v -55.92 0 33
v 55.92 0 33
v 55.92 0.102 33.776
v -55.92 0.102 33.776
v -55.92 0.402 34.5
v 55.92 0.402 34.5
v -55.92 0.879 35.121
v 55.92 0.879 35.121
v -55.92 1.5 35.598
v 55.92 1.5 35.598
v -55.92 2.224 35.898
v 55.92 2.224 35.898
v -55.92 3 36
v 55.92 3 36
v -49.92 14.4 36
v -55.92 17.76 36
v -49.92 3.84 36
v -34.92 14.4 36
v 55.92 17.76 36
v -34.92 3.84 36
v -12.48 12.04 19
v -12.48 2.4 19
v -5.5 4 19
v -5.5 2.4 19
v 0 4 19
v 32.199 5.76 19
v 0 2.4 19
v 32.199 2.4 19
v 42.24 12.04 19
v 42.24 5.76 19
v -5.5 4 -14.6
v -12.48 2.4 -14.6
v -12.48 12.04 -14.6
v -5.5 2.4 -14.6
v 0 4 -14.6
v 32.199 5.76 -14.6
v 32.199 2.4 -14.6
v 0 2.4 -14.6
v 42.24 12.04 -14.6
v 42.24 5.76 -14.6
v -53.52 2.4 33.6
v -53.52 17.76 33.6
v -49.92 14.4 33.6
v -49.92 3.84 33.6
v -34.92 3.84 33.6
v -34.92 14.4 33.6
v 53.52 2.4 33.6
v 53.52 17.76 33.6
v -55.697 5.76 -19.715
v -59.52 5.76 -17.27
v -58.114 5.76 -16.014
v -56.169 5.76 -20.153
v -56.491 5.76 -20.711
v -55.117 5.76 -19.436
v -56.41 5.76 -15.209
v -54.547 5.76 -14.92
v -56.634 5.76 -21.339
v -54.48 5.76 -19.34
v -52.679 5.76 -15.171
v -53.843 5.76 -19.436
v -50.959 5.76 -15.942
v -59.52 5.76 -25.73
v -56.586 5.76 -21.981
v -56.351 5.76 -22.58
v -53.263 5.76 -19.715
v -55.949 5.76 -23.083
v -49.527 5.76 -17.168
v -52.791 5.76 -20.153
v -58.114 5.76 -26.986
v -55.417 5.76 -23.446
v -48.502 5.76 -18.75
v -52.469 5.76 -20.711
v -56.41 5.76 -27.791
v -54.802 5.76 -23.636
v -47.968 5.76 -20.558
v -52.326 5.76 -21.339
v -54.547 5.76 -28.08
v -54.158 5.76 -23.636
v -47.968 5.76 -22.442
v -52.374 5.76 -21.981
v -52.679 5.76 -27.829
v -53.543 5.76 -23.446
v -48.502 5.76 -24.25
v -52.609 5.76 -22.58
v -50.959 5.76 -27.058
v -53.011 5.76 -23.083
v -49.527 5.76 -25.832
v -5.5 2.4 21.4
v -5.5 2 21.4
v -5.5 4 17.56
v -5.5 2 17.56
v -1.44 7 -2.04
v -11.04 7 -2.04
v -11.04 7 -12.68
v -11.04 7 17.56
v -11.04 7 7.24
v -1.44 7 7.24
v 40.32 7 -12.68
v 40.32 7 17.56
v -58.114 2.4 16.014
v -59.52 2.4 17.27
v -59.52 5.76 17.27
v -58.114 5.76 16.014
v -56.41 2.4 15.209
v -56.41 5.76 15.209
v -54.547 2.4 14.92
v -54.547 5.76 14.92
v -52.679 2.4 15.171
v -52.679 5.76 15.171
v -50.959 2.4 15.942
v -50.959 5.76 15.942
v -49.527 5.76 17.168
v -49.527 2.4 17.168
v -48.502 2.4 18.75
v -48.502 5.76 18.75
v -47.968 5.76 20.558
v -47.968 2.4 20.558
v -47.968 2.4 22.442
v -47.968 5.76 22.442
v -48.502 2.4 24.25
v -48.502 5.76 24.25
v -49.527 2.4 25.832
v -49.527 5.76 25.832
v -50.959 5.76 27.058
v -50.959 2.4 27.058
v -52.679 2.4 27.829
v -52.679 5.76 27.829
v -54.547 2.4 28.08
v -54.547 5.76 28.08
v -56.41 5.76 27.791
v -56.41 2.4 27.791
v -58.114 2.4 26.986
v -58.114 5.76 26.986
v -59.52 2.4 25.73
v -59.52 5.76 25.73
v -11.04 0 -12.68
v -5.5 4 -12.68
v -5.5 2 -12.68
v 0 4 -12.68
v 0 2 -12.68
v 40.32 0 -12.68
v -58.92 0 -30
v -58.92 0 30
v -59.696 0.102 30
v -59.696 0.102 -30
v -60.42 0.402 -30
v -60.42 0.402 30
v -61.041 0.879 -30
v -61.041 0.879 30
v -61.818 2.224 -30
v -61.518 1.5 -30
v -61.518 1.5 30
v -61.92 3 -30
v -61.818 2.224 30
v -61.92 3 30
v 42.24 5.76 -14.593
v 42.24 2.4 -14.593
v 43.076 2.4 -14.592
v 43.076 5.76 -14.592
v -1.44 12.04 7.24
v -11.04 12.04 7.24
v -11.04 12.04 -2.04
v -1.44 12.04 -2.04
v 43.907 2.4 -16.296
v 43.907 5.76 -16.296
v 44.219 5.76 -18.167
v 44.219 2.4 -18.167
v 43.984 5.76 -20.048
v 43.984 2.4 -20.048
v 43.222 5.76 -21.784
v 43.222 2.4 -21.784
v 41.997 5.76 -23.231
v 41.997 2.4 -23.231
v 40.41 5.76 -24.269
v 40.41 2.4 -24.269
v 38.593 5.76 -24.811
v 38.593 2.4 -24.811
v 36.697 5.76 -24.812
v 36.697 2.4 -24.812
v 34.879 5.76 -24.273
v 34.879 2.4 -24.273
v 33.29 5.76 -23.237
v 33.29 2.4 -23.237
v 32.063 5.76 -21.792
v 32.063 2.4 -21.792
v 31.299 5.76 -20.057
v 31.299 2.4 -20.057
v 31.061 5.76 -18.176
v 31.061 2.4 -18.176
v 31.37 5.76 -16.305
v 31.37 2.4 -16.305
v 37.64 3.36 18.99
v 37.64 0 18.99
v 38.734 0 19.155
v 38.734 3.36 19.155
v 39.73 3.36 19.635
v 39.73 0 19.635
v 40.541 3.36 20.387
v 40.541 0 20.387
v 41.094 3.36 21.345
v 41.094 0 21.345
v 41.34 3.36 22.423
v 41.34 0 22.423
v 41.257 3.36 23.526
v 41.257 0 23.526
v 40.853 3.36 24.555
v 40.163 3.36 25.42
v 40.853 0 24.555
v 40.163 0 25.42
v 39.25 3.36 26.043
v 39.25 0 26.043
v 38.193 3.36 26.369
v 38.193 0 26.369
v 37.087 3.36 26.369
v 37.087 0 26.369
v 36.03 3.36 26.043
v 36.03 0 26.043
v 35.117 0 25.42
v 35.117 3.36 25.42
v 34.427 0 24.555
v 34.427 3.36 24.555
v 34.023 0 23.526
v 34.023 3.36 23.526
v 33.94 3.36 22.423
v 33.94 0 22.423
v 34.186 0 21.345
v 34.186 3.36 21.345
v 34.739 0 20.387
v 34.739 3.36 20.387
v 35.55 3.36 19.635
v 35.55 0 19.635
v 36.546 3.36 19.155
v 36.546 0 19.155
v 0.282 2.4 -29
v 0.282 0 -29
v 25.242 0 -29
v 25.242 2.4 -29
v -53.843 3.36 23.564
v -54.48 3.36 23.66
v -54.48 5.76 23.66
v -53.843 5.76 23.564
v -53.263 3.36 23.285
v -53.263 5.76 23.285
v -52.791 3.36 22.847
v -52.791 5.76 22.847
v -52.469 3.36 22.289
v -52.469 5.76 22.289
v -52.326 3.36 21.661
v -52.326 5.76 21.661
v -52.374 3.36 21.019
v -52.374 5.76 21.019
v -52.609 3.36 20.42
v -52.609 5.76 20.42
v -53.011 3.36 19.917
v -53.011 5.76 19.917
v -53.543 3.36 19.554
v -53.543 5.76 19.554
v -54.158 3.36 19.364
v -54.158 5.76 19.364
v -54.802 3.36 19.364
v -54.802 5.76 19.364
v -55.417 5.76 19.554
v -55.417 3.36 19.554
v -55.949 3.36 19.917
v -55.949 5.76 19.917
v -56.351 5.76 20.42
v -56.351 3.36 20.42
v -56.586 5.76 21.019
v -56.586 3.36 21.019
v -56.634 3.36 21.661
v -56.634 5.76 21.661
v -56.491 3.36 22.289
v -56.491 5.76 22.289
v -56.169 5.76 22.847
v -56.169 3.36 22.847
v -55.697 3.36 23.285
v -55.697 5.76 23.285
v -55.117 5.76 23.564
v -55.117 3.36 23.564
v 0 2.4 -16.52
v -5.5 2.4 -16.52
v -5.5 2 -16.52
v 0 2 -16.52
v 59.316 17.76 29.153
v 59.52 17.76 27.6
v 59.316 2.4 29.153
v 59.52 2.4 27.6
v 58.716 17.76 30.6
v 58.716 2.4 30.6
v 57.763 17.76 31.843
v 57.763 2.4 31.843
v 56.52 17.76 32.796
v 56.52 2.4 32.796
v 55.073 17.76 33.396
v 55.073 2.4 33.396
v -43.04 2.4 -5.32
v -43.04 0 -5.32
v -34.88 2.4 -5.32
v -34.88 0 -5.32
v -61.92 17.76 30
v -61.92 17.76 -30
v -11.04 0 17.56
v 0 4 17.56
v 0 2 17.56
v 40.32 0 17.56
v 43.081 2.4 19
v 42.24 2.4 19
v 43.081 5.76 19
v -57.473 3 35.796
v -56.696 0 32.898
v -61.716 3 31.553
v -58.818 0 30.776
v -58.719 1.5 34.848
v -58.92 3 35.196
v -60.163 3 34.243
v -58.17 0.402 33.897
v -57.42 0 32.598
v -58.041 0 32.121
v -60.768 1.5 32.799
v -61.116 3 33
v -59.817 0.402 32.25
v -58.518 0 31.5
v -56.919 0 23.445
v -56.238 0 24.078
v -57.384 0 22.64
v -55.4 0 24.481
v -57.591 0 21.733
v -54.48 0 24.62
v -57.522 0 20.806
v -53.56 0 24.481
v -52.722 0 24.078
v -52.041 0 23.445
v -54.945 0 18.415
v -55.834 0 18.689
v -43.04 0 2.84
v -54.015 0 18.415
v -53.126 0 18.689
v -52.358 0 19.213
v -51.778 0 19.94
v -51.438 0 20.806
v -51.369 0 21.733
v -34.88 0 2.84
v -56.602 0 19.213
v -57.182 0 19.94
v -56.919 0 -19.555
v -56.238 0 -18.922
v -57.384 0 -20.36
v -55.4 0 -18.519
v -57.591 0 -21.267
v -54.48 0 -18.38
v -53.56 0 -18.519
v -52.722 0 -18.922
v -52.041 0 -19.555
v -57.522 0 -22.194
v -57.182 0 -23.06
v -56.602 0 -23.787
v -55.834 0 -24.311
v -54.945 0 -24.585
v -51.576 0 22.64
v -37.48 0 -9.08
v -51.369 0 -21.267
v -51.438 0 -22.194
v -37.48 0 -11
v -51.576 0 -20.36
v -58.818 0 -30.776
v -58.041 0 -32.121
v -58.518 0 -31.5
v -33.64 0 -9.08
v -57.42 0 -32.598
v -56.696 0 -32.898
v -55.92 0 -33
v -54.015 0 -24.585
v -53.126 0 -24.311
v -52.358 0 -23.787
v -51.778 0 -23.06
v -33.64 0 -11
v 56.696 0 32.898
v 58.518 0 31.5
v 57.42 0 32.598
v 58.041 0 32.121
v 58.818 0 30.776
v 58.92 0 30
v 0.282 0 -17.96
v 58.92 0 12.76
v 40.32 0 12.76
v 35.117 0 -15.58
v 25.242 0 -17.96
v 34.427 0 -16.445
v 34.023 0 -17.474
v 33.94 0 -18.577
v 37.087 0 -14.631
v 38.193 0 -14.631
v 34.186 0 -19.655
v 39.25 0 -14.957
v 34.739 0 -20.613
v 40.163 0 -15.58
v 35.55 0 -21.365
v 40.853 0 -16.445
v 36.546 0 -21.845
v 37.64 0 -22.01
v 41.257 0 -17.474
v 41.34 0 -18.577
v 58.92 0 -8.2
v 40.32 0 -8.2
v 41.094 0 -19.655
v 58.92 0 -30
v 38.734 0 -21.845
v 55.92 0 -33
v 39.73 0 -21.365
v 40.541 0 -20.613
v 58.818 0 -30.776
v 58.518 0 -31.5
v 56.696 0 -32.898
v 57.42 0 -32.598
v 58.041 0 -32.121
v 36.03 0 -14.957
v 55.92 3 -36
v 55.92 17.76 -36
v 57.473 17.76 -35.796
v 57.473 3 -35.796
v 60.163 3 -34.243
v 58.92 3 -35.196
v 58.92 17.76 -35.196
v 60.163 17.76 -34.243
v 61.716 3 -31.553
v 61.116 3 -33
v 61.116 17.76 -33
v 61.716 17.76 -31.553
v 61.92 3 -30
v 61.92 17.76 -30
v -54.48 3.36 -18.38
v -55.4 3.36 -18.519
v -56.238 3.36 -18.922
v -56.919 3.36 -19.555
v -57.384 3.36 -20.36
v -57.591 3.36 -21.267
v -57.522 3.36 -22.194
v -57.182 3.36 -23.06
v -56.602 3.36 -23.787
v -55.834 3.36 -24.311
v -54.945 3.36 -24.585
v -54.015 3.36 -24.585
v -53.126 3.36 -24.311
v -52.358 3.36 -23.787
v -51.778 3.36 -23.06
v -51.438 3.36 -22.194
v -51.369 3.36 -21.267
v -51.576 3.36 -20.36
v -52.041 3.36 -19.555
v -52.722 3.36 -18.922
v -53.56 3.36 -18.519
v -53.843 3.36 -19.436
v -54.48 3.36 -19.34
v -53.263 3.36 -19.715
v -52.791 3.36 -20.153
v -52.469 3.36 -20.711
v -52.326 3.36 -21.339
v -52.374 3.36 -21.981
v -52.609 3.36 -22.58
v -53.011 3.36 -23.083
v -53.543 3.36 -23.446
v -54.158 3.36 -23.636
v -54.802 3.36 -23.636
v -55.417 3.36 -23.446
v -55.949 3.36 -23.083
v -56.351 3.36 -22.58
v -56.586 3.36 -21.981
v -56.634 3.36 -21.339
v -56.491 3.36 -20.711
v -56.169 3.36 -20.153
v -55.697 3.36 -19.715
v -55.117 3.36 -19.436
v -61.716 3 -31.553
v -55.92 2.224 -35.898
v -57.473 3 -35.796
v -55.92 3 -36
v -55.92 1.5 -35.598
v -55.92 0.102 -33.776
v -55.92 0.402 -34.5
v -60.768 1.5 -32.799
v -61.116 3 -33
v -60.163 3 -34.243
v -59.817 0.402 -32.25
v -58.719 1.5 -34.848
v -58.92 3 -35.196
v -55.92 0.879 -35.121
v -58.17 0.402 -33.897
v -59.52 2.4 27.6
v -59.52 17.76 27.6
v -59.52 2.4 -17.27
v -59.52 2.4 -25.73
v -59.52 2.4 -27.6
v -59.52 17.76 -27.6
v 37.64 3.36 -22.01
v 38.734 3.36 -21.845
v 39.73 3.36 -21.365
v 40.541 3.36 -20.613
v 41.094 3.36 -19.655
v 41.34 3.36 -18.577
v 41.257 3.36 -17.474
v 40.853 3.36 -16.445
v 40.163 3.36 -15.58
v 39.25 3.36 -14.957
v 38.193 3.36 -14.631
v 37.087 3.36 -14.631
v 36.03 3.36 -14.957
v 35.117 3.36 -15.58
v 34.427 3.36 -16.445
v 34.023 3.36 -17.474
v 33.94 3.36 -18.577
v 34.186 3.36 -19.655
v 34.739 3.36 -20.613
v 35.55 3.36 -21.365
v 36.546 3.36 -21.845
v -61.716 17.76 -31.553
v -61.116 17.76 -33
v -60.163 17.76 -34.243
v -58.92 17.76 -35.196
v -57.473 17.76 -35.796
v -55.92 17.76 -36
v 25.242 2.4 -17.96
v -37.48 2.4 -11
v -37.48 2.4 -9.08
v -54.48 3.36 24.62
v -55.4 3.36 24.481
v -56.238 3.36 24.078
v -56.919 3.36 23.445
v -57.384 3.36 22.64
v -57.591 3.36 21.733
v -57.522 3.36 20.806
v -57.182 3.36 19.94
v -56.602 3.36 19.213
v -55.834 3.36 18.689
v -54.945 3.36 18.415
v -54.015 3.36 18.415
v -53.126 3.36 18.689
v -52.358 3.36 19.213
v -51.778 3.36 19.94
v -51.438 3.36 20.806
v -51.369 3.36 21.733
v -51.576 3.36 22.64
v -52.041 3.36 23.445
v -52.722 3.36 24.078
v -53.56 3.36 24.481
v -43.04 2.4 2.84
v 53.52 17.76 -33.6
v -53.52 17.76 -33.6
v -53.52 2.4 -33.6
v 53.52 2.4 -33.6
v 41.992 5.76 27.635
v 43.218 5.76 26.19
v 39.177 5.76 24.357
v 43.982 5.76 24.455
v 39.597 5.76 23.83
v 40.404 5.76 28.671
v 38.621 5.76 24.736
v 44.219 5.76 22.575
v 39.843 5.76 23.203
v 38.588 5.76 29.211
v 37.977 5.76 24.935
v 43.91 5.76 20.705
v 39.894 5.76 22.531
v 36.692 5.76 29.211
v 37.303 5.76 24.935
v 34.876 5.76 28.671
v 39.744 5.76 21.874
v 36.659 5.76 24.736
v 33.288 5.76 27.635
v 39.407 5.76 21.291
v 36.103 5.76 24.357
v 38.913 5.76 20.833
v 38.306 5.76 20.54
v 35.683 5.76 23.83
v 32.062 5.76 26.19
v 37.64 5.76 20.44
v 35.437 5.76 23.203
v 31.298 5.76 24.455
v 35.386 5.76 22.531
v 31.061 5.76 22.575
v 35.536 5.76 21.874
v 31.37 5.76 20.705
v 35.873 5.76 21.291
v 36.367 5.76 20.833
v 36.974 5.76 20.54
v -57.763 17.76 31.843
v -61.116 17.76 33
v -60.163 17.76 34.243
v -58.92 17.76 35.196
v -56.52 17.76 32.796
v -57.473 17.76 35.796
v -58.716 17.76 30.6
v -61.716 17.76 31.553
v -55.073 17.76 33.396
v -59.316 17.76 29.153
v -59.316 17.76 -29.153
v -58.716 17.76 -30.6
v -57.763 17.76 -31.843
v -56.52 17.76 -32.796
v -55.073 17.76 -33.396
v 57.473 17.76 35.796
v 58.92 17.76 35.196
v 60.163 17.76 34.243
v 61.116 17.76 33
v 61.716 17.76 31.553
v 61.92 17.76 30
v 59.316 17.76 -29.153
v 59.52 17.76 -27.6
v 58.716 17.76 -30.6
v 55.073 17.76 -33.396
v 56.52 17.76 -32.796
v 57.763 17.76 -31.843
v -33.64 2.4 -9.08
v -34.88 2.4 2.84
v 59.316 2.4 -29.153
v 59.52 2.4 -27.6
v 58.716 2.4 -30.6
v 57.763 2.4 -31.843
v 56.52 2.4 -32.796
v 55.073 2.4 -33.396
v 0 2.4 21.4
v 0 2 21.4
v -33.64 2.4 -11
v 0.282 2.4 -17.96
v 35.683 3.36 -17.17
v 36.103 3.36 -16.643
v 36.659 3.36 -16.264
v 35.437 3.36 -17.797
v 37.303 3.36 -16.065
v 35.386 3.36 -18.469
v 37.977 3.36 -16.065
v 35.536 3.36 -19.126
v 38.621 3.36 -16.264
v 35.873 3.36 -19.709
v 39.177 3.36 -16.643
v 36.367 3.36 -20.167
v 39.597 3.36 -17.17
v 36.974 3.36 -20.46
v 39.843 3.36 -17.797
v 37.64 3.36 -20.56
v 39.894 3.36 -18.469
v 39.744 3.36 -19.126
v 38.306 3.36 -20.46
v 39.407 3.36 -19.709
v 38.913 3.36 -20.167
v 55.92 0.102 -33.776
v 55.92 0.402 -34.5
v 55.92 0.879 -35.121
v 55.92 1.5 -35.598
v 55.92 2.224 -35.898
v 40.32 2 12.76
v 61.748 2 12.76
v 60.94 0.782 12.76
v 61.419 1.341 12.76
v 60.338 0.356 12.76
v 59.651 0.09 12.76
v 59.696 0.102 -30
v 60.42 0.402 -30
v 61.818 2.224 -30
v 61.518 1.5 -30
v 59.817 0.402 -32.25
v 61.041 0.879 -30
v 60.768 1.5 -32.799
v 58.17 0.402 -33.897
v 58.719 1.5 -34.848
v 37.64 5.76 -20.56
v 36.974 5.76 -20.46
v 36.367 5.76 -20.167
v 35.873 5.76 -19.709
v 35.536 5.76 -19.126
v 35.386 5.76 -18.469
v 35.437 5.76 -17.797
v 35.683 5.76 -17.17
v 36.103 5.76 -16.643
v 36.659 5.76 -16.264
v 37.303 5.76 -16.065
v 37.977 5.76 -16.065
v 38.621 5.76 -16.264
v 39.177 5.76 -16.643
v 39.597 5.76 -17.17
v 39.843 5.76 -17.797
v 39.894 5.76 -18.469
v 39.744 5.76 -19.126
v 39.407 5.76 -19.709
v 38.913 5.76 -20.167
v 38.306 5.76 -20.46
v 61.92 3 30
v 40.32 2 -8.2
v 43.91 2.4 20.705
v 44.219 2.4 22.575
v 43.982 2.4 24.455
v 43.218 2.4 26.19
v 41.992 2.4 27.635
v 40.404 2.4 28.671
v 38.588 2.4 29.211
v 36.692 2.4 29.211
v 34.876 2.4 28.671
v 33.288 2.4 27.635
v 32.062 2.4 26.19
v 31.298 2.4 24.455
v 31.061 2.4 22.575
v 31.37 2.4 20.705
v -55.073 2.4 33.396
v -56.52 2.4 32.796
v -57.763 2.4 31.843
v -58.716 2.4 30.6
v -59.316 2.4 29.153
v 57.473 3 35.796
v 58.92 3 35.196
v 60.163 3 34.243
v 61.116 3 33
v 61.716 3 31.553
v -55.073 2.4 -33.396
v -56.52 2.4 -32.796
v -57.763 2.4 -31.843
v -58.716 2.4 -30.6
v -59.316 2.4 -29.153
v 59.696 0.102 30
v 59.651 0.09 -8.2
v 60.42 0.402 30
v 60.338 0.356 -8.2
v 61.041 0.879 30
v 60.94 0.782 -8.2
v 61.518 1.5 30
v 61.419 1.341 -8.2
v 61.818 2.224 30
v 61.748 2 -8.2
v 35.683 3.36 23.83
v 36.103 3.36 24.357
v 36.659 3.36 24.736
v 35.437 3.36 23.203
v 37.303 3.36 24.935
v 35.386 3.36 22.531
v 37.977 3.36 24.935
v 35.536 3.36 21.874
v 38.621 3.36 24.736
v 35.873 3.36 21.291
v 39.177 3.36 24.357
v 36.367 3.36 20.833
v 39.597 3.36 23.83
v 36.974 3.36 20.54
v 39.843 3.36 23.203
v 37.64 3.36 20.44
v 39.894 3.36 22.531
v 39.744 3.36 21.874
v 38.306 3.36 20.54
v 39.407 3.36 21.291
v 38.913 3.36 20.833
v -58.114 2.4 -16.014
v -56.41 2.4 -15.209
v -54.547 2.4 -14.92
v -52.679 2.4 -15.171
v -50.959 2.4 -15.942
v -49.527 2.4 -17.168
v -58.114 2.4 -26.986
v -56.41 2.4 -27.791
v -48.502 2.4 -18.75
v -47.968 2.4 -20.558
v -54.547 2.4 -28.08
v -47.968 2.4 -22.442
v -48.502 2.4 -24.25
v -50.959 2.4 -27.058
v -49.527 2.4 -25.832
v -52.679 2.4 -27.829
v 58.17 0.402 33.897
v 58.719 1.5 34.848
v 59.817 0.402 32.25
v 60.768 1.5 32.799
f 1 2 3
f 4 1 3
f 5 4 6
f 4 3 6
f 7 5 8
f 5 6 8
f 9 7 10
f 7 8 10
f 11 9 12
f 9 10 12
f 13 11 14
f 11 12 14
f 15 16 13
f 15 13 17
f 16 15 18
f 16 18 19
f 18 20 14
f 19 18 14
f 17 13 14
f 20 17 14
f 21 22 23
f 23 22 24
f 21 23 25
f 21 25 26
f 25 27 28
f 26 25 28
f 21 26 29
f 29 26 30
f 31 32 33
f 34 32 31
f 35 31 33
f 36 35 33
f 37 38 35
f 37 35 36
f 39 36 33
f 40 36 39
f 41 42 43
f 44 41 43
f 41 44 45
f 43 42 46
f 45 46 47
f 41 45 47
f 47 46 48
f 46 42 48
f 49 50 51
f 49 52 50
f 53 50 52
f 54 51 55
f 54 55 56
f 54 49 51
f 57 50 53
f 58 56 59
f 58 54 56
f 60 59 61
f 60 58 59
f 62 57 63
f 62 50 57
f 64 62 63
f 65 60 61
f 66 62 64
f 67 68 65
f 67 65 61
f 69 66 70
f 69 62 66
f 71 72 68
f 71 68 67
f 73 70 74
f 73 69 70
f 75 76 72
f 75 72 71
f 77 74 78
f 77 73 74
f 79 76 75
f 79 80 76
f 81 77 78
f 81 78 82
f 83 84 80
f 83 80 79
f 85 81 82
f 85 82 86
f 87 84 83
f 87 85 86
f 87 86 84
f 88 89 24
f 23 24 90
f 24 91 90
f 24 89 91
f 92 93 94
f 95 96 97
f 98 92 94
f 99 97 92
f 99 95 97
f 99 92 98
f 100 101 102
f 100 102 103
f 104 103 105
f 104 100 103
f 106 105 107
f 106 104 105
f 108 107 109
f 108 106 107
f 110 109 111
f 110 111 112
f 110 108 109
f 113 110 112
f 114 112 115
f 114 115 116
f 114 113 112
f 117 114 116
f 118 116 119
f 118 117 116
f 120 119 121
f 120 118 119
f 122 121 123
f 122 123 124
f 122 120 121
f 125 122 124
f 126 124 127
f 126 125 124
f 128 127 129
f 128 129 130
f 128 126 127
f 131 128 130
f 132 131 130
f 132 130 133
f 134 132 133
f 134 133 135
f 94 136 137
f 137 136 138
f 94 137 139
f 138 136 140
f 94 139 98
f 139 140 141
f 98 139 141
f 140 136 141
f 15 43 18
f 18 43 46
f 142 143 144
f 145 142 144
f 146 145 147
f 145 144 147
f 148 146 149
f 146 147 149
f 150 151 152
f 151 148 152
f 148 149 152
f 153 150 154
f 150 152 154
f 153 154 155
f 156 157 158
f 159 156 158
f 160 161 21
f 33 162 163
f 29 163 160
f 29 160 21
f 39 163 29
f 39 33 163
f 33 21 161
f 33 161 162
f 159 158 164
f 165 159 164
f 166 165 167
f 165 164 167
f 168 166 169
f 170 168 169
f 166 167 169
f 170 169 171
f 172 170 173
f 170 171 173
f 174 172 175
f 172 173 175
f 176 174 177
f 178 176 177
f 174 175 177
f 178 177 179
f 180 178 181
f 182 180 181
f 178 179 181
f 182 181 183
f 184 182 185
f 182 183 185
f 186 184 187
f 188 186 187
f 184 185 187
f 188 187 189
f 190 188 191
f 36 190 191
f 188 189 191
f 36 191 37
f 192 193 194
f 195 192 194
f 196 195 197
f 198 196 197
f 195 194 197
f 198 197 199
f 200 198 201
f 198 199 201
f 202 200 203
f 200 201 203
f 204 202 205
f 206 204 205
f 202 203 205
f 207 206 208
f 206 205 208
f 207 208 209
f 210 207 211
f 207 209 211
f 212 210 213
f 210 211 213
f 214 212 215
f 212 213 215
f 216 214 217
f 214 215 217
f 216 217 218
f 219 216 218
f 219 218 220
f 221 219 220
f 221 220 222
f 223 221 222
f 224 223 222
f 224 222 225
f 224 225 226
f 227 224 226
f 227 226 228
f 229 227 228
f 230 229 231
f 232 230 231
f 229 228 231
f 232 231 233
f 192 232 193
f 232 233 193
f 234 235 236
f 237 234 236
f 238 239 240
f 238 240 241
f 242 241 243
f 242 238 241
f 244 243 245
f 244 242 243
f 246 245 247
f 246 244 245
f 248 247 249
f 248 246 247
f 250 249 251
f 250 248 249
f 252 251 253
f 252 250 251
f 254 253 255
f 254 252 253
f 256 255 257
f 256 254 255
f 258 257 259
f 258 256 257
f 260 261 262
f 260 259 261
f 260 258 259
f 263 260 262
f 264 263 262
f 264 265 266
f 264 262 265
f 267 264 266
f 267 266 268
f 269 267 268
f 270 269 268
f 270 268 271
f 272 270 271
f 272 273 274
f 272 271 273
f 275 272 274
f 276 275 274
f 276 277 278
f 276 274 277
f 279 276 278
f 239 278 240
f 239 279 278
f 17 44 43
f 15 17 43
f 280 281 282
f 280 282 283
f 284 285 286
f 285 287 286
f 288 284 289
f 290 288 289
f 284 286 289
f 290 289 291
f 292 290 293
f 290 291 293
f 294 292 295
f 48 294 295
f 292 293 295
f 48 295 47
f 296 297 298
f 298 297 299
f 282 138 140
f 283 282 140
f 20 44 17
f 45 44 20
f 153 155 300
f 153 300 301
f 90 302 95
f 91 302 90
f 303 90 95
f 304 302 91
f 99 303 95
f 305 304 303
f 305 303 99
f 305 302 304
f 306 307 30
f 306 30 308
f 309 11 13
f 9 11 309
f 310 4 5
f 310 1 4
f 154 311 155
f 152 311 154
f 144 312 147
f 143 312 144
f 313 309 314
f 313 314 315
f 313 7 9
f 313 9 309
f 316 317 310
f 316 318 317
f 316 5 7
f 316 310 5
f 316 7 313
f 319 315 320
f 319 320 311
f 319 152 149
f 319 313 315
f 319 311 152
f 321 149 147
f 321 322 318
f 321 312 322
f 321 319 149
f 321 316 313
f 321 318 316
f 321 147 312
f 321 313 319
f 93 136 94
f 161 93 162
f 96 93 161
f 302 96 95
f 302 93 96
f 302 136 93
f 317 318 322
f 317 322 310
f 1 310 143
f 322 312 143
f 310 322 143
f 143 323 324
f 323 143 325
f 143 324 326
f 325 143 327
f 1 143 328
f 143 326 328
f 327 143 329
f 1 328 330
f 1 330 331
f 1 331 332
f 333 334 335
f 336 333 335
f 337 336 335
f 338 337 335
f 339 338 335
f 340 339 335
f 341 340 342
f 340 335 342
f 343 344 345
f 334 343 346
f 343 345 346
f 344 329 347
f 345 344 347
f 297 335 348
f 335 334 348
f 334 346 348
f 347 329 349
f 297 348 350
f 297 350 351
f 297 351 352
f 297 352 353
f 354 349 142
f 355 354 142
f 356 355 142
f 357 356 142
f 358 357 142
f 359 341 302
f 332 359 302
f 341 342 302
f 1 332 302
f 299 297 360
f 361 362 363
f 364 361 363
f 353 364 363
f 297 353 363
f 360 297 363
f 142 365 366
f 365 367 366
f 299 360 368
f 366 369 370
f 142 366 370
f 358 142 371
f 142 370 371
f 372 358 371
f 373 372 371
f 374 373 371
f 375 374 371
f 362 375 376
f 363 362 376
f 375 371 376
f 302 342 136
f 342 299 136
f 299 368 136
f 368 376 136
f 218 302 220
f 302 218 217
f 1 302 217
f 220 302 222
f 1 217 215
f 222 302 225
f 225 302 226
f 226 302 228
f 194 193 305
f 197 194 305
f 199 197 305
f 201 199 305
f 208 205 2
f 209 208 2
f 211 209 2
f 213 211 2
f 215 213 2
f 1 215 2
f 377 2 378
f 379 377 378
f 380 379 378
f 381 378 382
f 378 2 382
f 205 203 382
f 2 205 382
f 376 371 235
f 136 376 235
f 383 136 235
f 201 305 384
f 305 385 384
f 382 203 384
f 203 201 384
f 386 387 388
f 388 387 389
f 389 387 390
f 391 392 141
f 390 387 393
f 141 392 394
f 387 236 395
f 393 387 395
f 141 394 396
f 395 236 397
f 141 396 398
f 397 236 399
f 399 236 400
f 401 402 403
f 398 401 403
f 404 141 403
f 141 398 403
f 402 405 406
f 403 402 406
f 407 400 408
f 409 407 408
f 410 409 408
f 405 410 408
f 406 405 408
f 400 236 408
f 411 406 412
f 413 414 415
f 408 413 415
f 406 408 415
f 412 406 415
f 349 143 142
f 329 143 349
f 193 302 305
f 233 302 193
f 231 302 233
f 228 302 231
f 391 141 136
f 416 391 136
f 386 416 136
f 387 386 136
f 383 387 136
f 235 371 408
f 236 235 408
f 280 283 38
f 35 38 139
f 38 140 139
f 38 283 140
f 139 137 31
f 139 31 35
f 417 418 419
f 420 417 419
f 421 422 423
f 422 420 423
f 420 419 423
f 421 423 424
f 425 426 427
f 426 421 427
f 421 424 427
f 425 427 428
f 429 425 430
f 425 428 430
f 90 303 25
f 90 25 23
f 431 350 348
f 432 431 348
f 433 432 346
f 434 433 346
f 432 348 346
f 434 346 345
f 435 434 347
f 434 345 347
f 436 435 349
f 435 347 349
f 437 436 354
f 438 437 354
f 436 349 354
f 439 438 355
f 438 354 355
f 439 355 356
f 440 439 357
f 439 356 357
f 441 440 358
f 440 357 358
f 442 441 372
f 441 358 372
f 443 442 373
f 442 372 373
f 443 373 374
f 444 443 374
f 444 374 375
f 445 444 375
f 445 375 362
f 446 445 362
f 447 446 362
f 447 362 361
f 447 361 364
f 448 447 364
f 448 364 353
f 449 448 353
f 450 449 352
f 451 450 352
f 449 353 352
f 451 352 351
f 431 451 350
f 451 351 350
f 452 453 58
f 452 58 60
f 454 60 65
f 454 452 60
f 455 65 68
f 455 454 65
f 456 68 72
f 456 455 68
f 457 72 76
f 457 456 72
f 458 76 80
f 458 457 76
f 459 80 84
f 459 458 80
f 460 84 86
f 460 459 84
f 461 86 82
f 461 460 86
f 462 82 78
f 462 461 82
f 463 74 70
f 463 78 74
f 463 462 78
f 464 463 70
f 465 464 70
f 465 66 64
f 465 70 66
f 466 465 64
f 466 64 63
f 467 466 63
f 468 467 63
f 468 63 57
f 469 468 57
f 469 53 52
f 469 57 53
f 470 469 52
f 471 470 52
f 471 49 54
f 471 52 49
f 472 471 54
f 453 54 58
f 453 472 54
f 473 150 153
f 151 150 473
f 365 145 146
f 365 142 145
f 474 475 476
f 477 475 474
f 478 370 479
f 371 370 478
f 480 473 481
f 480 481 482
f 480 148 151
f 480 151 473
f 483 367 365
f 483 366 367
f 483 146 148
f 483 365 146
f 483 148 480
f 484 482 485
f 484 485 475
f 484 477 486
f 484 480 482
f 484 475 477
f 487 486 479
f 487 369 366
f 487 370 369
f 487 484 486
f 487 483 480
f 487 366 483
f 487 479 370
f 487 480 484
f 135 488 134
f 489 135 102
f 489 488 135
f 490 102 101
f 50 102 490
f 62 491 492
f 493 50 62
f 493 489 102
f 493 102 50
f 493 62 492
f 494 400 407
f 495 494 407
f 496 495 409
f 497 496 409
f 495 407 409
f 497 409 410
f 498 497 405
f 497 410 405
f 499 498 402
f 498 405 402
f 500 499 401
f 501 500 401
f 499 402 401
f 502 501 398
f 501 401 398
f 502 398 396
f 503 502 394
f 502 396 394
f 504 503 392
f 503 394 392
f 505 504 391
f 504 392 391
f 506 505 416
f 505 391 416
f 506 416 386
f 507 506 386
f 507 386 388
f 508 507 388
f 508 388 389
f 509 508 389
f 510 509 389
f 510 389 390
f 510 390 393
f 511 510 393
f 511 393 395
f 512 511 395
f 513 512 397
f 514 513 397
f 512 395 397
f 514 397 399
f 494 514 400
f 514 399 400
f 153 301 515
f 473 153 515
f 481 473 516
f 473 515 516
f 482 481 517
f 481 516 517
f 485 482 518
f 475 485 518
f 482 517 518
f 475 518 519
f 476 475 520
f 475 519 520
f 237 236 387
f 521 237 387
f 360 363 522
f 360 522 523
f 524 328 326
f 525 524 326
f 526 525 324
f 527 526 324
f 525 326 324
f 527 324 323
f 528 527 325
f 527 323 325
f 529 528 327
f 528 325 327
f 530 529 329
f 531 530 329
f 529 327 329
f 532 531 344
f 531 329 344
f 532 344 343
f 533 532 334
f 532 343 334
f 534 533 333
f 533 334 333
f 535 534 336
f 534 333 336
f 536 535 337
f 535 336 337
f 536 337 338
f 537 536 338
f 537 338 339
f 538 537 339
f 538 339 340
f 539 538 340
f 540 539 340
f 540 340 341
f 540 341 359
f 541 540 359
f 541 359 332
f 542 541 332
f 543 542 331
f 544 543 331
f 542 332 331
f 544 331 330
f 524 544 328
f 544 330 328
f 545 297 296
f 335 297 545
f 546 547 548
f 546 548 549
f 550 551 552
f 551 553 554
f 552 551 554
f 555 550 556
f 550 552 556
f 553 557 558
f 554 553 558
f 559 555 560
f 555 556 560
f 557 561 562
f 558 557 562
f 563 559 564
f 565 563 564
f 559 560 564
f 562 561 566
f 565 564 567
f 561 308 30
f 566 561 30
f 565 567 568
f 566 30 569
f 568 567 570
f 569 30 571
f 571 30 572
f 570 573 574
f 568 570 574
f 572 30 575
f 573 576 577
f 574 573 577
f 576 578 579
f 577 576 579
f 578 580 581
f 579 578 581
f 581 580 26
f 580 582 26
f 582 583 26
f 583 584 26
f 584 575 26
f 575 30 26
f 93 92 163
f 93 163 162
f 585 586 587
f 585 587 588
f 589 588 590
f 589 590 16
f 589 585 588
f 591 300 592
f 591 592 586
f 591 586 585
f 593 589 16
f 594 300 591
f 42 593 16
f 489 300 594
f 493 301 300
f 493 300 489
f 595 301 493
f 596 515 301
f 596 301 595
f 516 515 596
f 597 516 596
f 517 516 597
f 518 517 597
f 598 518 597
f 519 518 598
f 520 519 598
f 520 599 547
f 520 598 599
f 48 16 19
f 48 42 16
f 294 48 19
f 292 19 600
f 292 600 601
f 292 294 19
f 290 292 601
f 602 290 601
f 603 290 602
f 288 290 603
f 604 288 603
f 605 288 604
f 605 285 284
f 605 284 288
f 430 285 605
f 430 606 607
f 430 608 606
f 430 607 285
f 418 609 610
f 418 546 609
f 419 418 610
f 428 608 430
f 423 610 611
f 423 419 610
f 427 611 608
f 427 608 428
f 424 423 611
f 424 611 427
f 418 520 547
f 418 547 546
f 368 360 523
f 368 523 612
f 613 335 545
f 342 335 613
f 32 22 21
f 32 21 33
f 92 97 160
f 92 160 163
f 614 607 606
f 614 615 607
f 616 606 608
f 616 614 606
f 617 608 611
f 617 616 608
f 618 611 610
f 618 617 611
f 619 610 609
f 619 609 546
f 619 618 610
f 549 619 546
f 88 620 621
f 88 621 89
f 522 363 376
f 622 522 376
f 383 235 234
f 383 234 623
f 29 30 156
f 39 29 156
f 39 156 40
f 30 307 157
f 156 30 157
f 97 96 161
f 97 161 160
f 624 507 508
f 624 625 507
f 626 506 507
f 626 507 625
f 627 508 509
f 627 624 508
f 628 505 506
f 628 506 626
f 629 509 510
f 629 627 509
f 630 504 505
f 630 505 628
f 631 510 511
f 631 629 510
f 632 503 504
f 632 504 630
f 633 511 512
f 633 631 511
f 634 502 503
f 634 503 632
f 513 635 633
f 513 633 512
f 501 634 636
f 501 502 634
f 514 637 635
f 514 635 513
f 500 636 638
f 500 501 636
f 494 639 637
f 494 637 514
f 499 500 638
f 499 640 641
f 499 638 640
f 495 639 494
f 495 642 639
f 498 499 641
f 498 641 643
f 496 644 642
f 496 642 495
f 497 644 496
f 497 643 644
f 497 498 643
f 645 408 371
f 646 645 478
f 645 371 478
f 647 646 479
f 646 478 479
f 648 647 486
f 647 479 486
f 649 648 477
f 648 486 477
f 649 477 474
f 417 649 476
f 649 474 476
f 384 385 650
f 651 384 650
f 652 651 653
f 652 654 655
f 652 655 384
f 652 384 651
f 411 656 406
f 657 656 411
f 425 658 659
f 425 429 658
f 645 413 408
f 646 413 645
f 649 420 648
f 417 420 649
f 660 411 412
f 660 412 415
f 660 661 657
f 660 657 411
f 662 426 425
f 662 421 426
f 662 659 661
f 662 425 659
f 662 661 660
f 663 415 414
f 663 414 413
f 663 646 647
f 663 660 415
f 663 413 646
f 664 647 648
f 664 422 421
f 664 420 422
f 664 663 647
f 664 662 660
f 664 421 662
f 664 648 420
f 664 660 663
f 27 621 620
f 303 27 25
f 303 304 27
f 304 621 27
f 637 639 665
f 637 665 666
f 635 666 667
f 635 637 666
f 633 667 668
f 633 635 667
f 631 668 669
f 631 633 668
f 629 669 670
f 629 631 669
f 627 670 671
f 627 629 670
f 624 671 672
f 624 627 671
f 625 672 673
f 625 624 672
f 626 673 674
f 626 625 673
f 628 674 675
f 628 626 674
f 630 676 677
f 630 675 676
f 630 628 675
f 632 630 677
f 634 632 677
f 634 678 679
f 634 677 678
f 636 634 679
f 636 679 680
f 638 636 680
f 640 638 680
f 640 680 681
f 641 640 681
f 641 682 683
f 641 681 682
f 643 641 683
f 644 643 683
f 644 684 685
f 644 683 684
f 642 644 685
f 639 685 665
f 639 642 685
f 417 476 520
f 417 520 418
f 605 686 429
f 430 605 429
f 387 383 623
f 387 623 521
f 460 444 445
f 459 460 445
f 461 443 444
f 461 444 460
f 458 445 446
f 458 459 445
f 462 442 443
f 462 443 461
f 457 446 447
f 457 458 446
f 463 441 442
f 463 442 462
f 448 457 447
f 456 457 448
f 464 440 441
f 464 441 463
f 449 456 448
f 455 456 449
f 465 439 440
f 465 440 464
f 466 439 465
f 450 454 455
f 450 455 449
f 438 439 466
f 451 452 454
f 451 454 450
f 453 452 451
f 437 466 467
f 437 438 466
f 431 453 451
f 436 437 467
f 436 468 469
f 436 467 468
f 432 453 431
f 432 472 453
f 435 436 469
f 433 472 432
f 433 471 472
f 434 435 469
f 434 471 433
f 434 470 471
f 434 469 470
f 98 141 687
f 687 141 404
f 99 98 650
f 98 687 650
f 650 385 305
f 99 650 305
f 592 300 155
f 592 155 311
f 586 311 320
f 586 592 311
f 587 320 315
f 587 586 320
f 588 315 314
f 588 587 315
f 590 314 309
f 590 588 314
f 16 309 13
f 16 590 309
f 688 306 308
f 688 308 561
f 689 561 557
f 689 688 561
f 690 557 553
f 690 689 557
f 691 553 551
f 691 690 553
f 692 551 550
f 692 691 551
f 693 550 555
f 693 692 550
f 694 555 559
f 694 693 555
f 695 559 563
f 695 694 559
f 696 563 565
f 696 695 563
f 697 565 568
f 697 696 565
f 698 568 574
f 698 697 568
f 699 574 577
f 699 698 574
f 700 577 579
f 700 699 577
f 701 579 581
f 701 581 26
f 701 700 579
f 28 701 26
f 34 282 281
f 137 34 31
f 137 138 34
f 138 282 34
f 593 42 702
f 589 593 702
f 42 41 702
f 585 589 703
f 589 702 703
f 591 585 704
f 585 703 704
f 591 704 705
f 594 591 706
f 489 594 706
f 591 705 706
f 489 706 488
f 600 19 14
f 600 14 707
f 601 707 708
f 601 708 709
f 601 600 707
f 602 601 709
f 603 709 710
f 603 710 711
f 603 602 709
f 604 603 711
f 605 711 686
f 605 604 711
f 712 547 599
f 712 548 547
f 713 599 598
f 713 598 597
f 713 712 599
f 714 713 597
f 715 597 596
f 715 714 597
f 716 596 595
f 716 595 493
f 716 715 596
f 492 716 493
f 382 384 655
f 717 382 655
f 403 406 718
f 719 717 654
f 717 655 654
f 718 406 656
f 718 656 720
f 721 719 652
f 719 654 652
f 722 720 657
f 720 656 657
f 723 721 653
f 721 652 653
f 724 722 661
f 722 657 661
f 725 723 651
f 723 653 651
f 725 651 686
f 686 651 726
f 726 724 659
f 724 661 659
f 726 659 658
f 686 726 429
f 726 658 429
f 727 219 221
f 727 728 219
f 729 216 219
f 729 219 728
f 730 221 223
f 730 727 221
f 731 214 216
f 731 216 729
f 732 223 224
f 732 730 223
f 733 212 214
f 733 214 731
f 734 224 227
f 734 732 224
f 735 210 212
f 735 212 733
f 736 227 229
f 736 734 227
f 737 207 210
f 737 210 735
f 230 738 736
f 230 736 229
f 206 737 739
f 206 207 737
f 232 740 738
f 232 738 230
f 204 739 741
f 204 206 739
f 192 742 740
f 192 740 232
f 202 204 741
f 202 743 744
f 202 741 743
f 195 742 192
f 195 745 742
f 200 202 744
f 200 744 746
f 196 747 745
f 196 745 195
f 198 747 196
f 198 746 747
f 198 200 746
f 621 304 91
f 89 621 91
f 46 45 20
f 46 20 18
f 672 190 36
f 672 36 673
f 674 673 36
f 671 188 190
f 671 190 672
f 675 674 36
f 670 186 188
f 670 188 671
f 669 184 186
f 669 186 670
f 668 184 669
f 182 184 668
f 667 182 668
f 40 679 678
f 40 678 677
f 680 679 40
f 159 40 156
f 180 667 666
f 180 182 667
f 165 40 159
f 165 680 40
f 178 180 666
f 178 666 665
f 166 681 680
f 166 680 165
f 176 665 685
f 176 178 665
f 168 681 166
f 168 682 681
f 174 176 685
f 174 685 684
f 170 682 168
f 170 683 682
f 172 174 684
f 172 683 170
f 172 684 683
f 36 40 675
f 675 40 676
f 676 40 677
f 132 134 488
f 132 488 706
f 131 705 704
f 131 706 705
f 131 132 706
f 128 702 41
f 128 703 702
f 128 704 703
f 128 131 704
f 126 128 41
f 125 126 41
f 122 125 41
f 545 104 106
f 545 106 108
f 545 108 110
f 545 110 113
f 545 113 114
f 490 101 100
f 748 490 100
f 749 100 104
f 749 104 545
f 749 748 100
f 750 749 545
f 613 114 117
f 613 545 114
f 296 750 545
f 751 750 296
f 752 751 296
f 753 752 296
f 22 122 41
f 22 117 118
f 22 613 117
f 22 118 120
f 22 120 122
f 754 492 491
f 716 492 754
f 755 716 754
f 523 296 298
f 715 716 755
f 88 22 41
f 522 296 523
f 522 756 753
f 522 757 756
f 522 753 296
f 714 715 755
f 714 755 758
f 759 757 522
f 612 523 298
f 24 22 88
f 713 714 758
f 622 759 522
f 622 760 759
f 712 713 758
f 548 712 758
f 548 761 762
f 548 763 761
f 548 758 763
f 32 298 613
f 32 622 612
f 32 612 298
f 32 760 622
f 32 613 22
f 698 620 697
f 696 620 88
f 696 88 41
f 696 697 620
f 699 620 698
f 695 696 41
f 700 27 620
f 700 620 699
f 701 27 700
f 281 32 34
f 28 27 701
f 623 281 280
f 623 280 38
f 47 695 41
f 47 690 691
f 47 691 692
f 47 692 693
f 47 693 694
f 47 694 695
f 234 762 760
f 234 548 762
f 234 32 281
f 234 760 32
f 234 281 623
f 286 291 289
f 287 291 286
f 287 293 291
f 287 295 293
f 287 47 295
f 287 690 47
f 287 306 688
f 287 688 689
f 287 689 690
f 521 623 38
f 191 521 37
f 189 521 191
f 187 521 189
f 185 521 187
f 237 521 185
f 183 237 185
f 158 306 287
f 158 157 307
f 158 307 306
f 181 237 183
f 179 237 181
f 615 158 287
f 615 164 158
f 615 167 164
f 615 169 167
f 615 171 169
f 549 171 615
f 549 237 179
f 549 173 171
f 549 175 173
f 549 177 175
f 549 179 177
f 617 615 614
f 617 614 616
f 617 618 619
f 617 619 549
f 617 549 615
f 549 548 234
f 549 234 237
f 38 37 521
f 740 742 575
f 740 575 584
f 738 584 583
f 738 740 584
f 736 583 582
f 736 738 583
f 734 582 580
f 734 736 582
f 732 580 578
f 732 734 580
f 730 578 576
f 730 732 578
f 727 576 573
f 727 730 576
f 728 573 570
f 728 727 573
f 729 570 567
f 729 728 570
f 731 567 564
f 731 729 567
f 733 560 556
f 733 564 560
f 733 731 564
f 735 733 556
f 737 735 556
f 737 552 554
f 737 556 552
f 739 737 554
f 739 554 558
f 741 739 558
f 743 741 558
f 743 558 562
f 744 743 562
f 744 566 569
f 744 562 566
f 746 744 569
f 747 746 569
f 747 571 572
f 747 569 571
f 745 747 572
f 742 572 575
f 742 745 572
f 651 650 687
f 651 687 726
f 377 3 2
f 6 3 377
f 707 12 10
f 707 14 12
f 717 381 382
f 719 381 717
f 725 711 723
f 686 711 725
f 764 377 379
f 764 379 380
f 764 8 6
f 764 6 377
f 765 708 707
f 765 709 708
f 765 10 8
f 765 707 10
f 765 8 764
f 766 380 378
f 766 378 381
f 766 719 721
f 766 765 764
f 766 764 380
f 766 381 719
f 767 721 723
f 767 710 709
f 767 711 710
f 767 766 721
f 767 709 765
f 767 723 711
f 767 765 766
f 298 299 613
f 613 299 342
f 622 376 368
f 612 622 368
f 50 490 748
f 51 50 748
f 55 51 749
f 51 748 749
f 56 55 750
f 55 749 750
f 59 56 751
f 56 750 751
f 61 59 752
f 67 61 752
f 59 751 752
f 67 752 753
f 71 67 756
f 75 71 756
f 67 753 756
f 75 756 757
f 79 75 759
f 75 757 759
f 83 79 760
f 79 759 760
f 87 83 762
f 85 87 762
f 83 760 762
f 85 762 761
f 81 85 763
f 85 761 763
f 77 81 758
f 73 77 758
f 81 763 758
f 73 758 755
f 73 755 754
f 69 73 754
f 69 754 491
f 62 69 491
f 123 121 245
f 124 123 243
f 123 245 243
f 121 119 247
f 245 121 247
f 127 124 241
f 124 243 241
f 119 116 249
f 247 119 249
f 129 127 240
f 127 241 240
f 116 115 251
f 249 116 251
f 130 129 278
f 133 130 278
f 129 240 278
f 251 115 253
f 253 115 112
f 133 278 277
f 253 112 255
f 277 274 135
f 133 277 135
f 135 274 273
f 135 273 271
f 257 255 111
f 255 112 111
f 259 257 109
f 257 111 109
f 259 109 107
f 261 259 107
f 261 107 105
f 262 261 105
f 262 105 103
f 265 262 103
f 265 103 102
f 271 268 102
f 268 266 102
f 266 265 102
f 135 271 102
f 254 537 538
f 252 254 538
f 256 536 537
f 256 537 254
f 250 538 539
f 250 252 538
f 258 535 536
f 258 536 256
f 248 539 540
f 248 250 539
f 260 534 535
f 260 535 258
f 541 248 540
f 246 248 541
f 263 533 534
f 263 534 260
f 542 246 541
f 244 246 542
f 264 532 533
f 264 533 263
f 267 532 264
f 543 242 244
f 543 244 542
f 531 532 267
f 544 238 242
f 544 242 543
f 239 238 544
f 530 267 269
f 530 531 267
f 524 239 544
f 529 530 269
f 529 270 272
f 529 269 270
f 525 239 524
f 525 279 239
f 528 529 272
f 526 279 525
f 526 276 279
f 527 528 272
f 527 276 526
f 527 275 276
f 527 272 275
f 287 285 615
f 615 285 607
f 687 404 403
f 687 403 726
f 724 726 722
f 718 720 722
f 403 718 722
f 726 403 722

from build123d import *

# Parameters (mm, degrees)
SKETCH_1_W           = 123.84
SKETCH_1_H           = 72
EXTRUDE_1_DEPTH      = 17.76
SKETCH_8_W           = 119.04
SKETCH_8_H           = 67.2
CUT_EXTRUDE_5_DEPTH  = 15.36
SKETCH_10_W          = 54.72
SKETCH_10_H          = 33.6
EXTRUDE_2_DEPTH      = 9.64
SKETCH_11_W          = 15
SKETCH_11_H          = 10.56
CUT_EXTRUDE_7_DEPTH  = 5
SKETCH_12_W          = 51.36
SKETCH_12_H          = 30.24
CUT_EXTRUDE_8_DEPTH  = 7
SKETCH_13_W          = 24.6
SKETCH_13_H          = 20.96
CUT_EXTRUDE_9_DEPTH  = 2
CUT_EXTRUDE_16_DEPTH = 73.428336996
FILLET_1_R           = 6
FILLET_3_R           = 3
FILLET_5_R           = 6
SKETCH_19_W          = 5.5
SKETCH_19_H          = 2
CUT_EXTRUDE_14_DEPTH = 3.84
SKETCH_20_W          = 5.5
SKETCH_20_H          = 2
CUT_EXTRUDE_15_DEPTH = 3.84
EXTRUDE_3_DEPTH      = 3.36
EXTRUDE_4_DEPTH      = 3.36
SKETCH_25_R          = 2.16
SKETCH_25_R_2        = 2.26
CUT_EXTRUDE_17_DEPTH = 74.793658264
SKETCH_22_R          = 3.71
SKETCH_22_R_2        = 3.12
CUT_EXTRUDE_18_DEPTH = 3.36
SKETCH_26_W          = 24.96
SKETCH_26_H          = 11.04
SKETCH_26_W_2        = 3.84
SKETCH_26_H_2        = 1.92
SKETCH_26_W_3        = 8.16
SKETCH_26_H_3        = 8.16
CUT_EXTRUDE_19_DEPTH = 74.793658264


with BuildPart() as part:
    # Эскиз1 → Бобышка-Вытянуть1 (new body)
    with BuildSketch(Plane(origin=(0, 0, 0), x_dir=(1, 0, 0), z_dir=(0, 1, 0))):
        Rectangle(SKETCH_1_W, SKETCH_1_H)
    extrude(amount=EXTRUDE_1_DEPTH)

    # Эскиз8 → Вырез-Вытянуть5 (cut)
    with BuildSketch(Plane(origin=(0, 17.76, 0), x_dir=(1, 0, 0), z_dir=(0, 1, 0))):
        Rectangle(SKETCH_8_W, SKETCH_8_H)
    extrude(amount=-CUT_EXTRUDE_5_DEPTH, mode=Mode.SUBTRACT)

    # Эскиз10 → Бобышка-Вытянуть2 (add)
    with BuildSketch(Plane(origin=(0, 2.4, 0), x_dir=(1, 0, 0), z_dir=(0, 1, 0))):
        with Locations((14.88, -2.2)):
            Rectangle(SKETCH_10_W, SKETCH_10_H)
    extrude(amount=EXTRUDE_2_DEPTH)

    # Эскиз11 → Вырез-Вытянуть7 (cut)
    with BuildSketch(Plane.XY.offset(33.6)):
        with Locations((-42.42, 9.12)):
            Rectangle(SKETCH_11_W, SKETCH_11_H)
    extrude(amount=CUT_EXTRUDE_7_DEPTH, mode=Mode.SUBTRACT)

    # Эскиз12 → Вырез-Вытянуть8 (cut)
    with BuildSketch(Plane.XZ):
        with Locations((14.64, 2.44)):
            Rectangle(SKETCH_12_W, SKETCH_12_H)
    extrude(amount=-CUT_EXTRUDE_8_DEPTH, mode=Mode.SUBTRACT)

    # Эскиз13 → Вырез-Вытянуть9 (cut)
    with BuildSketch(Plane.XZ):
        with Locations((49.62, 2.28)):
            Rectangle(SKETCH_13_W, SKETCH_13_H)
    extrude(amount=-CUT_EXTRUDE_9_DEPTH, mode=Mode.SUBTRACT)

    # Эскиз21 → Вырез-Вытянуть16 (cut, through all)
    with BuildSketch(Plane.XZ.offset(-7)):
        Polygon((-1.44, 7.24), (-1.44, -2.04), (-11.04, -2.04), (-11.04, 2.44), (-11.04, 7.24), align=None)
    extrude(amount=-CUT_EXTRUDE_16_DEPTH, mode=Mode.SUBTRACT)

    # Скругление1
    fillet_1_edges = [part.edges().sort_by_distance(p)[0] for p in [
        (-61.92, 8.88, -36),
        (61.92, 8.88, -36),
        (61.92, 8.88, 36),
        (-61.92, 8.88, 36),
    ]]
    fillet(fillet_1_edges, radius=FILLET_1_R)

    # Скругление3
    # the kernel refuses this fillet: 3 mm, written as the material it takes off along each edge
    with BuildSketch(Plane(origin=(55.92, 0, -30), x_dir=(1, 0, 0), z_dir=(0, 0, 1))) as fillet_3_piece_1:
        with BuildLine():
            CenterArc((6 - FILLET_3_R, FILLET_3_R), FILLET_3_R, 270, 90)
            Line((6, FILLET_3_R), (6 + FILLET_3_R * 0.02, FILLET_3_R))
            Line((6 + FILLET_3_R * 0.02, FILLET_3_R), (6 + FILLET_3_R * 0.02, -FILLET_3_R * 0.02))
            Line((6 + FILLET_3_R * 0.02, -FILLET_3_R * 0.02), (6 - FILLET_3_R, -FILLET_3_R * 0.02))
            Line((6 - FILLET_3_R, -FILLET_3_R * 0.02), (6 - FILLET_3_R, 0))
        make_face()
    revolve(axis=Axis((55.92, 0, -30), (0, 1, 0)), revolution_arc=90, mode=Mode.SUBTRACT)
    with BuildSketch(Plane(origin=(-55.92, 0, -36), x_dir=(0, 0, 1), z_dir=(1, 0, 0))) as fillet_3_piece_2:
        with BuildLine():
            CenterArc((FILLET_3_R, -FILLET_3_R), FILLET_3_R, 90, 90)
            Line((0, -FILLET_3_R), (-FILLET_3_R * 0.02, -FILLET_3_R))
            Line((-FILLET_3_R * 0.02, -FILLET_3_R), (-FILLET_3_R * 0.02, FILLET_3_R * 0.02))
            Line((-FILLET_3_R * 0.02, FILLET_3_R * 0.02), (FILLET_3_R, FILLET_3_R * 0.02))
            Line((FILLET_3_R, FILLET_3_R * 0.02), (FILLET_3_R, 0))
        make_face()
    extrude(amount=111.84, mode=Mode.SUBTRACT)
    with BuildSketch(Plane(origin=(-55.92, 0, -30), x_dir=(-1, 0, 0), z_dir=(0, 0, 1))) as fillet_3_piece_3:
        with BuildLine():
            CenterArc((6 - FILLET_3_R, -FILLET_3_R), FILLET_3_R, 0, 90)
            Line((6, -FILLET_3_R), (6 + FILLET_3_R * 0.02, -FILLET_3_R))
            Line((6 + FILLET_3_R * 0.02, -FILLET_3_R), (6 + FILLET_3_R * 0.02, FILLET_3_R * 0.02))
            Line((6 + FILLET_3_R * 0.02, FILLET_3_R * 0.02), (6 - FILLET_3_R, FILLET_3_R * 0.02))
            Line((6 - FILLET_3_R, FILLET_3_R * 0.02), (6 - FILLET_3_R, 0))
        make_face()
    revolve(axis=Axis((-55.92, 0, -30), (0, -1, 0)), revolution_arc=90, mode=Mode.SUBTRACT)
    with BuildSketch(Plane(origin=(-61.92, 0, 30), x_dir=(1, 0, 0), z_dir=(0, 0, -1))) as fillet_3_piece_4:
        with BuildLine():
            CenterArc((FILLET_3_R, -FILLET_3_R), FILLET_3_R, 90, 90)
            Line((0, -FILLET_3_R), (-FILLET_3_R * 0.02, -FILLET_3_R))
            Line((-FILLET_3_R * 0.02, -FILLET_3_R), (-FILLET_3_R * 0.02, FILLET_3_R * 0.02))
            Line((-FILLET_3_R * 0.02, FILLET_3_R * 0.02), (FILLET_3_R, FILLET_3_R * 0.02))
            Line((FILLET_3_R, FILLET_3_R * 0.02), (FILLET_3_R, 0))
        make_face()
    extrude(amount=60, mode=Mode.SUBTRACT)
    with BuildSketch(Plane(origin=(-55.92, 0, 30), x_dir=(0, 0, 1), z_dir=(1, 0, 0))) as fillet_3_piece_5:
        with BuildLine():
            CenterArc((6 - FILLET_3_R, -FILLET_3_R), FILLET_3_R, 0, 90)
            Line((6, -FILLET_3_R), (6 + FILLET_3_R * 0.02, -FILLET_3_R))
            Line((6 + FILLET_3_R * 0.02, -FILLET_3_R), (6 + FILLET_3_R * 0.02, FILLET_3_R * 0.02))
            Line((6 + FILLET_3_R * 0.02, FILLET_3_R * 0.02), (6 - FILLET_3_R, FILLET_3_R * 0.02))
            Line((6 - FILLET_3_R, FILLET_3_R * 0.02), (6 - FILLET_3_R, 0))
        make_face()
    revolve(axis=Axis((-55.92, 0, 30), (0, -1, 0)), revolution_arc=90, mode=Mode.SUBTRACT)
    with BuildSketch(Plane(origin=(61.92, 0, -5.24), x_dir=(-1, 0, 0), z_dir=(0, 0, 1))) as fillet_3_piece_6:
        with BuildLine():
            CenterArc((FILLET_3_R, -FILLET_3_R), FILLET_3_R, 90, 90)
            Line((0, -FILLET_3_R), (-FILLET_3_R * 0.02, -FILLET_3_R))
            Line((-FILLET_3_R * 0.02, -FILLET_3_R), (-FILLET_3_R * 0.02, FILLET_3_R * 0.02))
            Line((-FILLET_3_R * 0.02, FILLET_3_R * 0.02), (FILLET_3_R, FILLET_3_R * 0.02))
            Line((FILLET_3_R, FILLET_3_R * 0.02), (FILLET_3_R, 0))
        make_face()
    extrude(amount=35.24, mode=Mode.SUBTRACT)
    with BuildSketch(Plane(origin=(55.92, 0, 30), x_dir=(0, 0, 1), z_dir=(-1, 0, 0))) as fillet_3_piece_7:
        with BuildLine():
            CenterArc((6 - FILLET_3_R, FILLET_3_R), FILLET_3_R, 270, 90)
            Line((6, FILLET_3_R), (6 + FILLET_3_R * 0.02, FILLET_3_R))
            Line((6 + FILLET_3_R * 0.02, FILLET_3_R), (6 + FILLET_3_R * 0.02, -FILLET_3_R * 0.02))
            Line((6 + FILLET_3_R * 0.02, -FILLET_3_R * 0.02), (6 - FILLET_3_R, -FILLET_3_R * 0.02))
            Line((6 - FILLET_3_R, -FILLET_3_R * 0.02), (6 - FILLET_3_R, 0))
        make_face()
    revolve(axis=Axis((55.92, 0, 30), (0, 1, 0)), revolution_arc=90, mode=Mode.SUBTRACT)
    with BuildSketch(Plane(origin=(55.92, 0, 36), x_dir=(0, 1, 0), z_dir=(-1, 0, 0))) as fillet_3_piece_8:
        with BuildLine():
            CenterArc((FILLET_3_R, FILLET_3_R), FILLET_3_R, 180, 90)
            Line((0, FILLET_3_R), (-FILLET_3_R * 0.02, FILLET_3_R))
            Line((-FILLET_3_R * 0.02, FILLET_3_R), (-FILLET_3_R * 0.02, -FILLET_3_R * 0.02))
            Line((-FILLET_3_R * 0.02, -FILLET_3_R * 0.02), (FILLET_3_R, -FILLET_3_R * 0.02))
            Line((FILLET_3_R, -FILLET_3_R * 0.02), (FILLET_3_R, 0))
        make_face()
    extrude(amount=111.84, mode=Mode.SUBTRACT)
    with BuildSketch(Plane(origin=(61.92, 0, -30), x_dir=(-1, 0, 0), z_dir=(0, 0, 1))) as fillet_3_piece_9:
        with BuildLine():
            CenterArc((FILLET_3_R, -FILLET_3_R), FILLET_3_R, 90, 90)
            Line((0, -FILLET_3_R), (-FILLET_3_R * 0.02, -FILLET_3_R))
            Line((-FILLET_3_R * 0.02, -FILLET_3_R), (-FILLET_3_R * 0.02, FILLET_3_R * 0.02))
            Line((-FILLET_3_R * 0.02, FILLET_3_R * 0.02), (FILLET_3_R, FILLET_3_R * 0.02))
            Line((FILLET_3_R, FILLET_3_R * 0.02), (FILLET_3_R, 0))
        make_face()
    extrude(amount=39.8, mode=Mode.SUBTRACT)

    # Скругление5
    fillet_5_edges = [part.edges().sort_by_distance(p)[0] for p in [
        (-59.52, 10.08, 33.6),
        (-59.52, 10.08, -33.6),
        (59.52, 10.08, -33.6),
        (59.52, 10.08, 33.6),
    ]]
    fillet(fillet_5_edges, radius=FILLET_5_R)

    # Эскиз19 → Вырез-Вытянуть14 (cut)
    with BuildSketch(Plane(origin=(0, 0, 17.56), x_dir=(-1, 0, 0), z_dir=(0, 0, -1))):
        with Locations((2.75, 3)):
            Rectangle(SKETCH_19_W, SKETCH_19_H)
    extrude(amount=-CUT_EXTRUDE_14_DEPTH, mode=Mode.SUBTRACT)

    # Эскиз20 → Вырез-Вытянуть15 (cut)
    with BuildSketch(Plane.XY.offset(-12.68)):
        with Locations((-2.75, 3)):
            Rectangle(SKETCH_20_W, SKETCH_20_H)
    extrude(amount=-CUT_EXTRUDE_15_DEPTH, mode=Mode.SUBTRACT)

    # Эскиз24 → Бобышка-Вытянуть3 (add)
    with BuildSketch(Plane(origin=(0, 2.4, 0), x_dir=(1, 0, 0), z_dir=(0, 1, 0))):
        with BuildLine():
            Line((32.198823657, -19), (43.081176343, -19))
            ThreePointArc((43.081176343, -19), (37.64, -29.28), (32.198823657, -19))
        make_face()
        with BuildLine():
            Line((32.198823657, 14.6), (43.075947447, 14.592322107))
            ThreePointArc((43.075947447, 14.592322107), (37.644644658, 24.879998361), (32.198823657, 14.6))
        make_face()
    extrude(amount=EXTRUDE_3_DEPTH)

    # Эскиз23 → Бобышка-Вытянуть4 (add)
    with BuildSketch(Plane(origin=(0, 2.4, 0), x_dir=(1, 0, 0), z_dir=(0, 1, 0))):
        with BuildLine():
            Line((-59.52, 25.73022458), (-59.52, 17.26977542))
            ThreePointArc((-59.52, 17.26977542), (-47.9, 21.5), (-59.52, 25.73022458))
        make_face()
        with BuildLine():
            Line((-59.52, -25.73022458), (-59.52, -17.26977542))
            ThreePointArc((-59.52, -17.26977542), (-47.9, -21.5), (-59.52, -25.73022458))
        make_face()
    extrude(amount=EXTRUDE_4_DEPTH)

    # Эскиз25 → Вырез-Вытянуть17 (cut, through all)
    with BuildSketch(Plane(origin=(0, 0, 0), x_dir=(1, 0, 0), z_dir=(0, 1, 0))):
        with Locations(Location((-54.48, -21.5, 0), (0, 0, 270))):
            Circle(SKETCH_25_R)
        with Locations(Location((-54.48, 21.5, 0), (0, 0, 270))):
            Circle(SKETCH_25_R)
        with Locations(Location((37.64, 18.3, 0), (0, 0, 90))):
            Circle(SKETCH_25_R_2)
        with Locations(Location((37.64, -22.7, 0), (0, 0, 90))):
            Circle(SKETCH_25_R_2)
    extrude(amount=CUT_EXTRUDE_17_DEPTH, mode=Mode.SUBTRACT)

    # Эскиз22 → Вырез-Вытянуть18 (cut)
    with BuildSketch(Plane.XZ):
        with Locations(Location((37.64, -18.3, 0), (0, 0, 270))):
            Circle(SKETCH_22_R)
        with Locations(Location((37.64, 22.7, 0), (0, 0, 270))):
            Circle(SKETCH_22_R)
        with Locations(Location((-54.48, 21.5, 0), (0, 0, 90))):
            Circle(SKETCH_22_R_2)
        with Locations(Location((-54.48, -21.5, 0), (0, 0, 90))):
            Circle(SKETCH_22_R_2)
    extrude(amount=-CUT_EXTRUDE_18_DEPTH, mode=Mode.SUBTRACT)

    # Эскиз26 → Вырез-Вытянуть19 (cut, through all)
    with BuildSketch(Plane.XZ):
        with Locations((12.761591223, -23.48)):
            Rectangle(SKETCH_26_W, SKETCH_26_H)
        with Locations((-35.56, -10.04)):
            Rectangle(SKETCH_26_W_2, SKETCH_26_H_2)
        with Locations((-38.96, -1.24)):
            Rectangle(SKETCH_26_W_3, SKETCH_26_H_3)
    extrude(amount=-CUT_EXTRUDE_19_DEPTH, mode=Mode.SUBTRACT)


solid = part.part
